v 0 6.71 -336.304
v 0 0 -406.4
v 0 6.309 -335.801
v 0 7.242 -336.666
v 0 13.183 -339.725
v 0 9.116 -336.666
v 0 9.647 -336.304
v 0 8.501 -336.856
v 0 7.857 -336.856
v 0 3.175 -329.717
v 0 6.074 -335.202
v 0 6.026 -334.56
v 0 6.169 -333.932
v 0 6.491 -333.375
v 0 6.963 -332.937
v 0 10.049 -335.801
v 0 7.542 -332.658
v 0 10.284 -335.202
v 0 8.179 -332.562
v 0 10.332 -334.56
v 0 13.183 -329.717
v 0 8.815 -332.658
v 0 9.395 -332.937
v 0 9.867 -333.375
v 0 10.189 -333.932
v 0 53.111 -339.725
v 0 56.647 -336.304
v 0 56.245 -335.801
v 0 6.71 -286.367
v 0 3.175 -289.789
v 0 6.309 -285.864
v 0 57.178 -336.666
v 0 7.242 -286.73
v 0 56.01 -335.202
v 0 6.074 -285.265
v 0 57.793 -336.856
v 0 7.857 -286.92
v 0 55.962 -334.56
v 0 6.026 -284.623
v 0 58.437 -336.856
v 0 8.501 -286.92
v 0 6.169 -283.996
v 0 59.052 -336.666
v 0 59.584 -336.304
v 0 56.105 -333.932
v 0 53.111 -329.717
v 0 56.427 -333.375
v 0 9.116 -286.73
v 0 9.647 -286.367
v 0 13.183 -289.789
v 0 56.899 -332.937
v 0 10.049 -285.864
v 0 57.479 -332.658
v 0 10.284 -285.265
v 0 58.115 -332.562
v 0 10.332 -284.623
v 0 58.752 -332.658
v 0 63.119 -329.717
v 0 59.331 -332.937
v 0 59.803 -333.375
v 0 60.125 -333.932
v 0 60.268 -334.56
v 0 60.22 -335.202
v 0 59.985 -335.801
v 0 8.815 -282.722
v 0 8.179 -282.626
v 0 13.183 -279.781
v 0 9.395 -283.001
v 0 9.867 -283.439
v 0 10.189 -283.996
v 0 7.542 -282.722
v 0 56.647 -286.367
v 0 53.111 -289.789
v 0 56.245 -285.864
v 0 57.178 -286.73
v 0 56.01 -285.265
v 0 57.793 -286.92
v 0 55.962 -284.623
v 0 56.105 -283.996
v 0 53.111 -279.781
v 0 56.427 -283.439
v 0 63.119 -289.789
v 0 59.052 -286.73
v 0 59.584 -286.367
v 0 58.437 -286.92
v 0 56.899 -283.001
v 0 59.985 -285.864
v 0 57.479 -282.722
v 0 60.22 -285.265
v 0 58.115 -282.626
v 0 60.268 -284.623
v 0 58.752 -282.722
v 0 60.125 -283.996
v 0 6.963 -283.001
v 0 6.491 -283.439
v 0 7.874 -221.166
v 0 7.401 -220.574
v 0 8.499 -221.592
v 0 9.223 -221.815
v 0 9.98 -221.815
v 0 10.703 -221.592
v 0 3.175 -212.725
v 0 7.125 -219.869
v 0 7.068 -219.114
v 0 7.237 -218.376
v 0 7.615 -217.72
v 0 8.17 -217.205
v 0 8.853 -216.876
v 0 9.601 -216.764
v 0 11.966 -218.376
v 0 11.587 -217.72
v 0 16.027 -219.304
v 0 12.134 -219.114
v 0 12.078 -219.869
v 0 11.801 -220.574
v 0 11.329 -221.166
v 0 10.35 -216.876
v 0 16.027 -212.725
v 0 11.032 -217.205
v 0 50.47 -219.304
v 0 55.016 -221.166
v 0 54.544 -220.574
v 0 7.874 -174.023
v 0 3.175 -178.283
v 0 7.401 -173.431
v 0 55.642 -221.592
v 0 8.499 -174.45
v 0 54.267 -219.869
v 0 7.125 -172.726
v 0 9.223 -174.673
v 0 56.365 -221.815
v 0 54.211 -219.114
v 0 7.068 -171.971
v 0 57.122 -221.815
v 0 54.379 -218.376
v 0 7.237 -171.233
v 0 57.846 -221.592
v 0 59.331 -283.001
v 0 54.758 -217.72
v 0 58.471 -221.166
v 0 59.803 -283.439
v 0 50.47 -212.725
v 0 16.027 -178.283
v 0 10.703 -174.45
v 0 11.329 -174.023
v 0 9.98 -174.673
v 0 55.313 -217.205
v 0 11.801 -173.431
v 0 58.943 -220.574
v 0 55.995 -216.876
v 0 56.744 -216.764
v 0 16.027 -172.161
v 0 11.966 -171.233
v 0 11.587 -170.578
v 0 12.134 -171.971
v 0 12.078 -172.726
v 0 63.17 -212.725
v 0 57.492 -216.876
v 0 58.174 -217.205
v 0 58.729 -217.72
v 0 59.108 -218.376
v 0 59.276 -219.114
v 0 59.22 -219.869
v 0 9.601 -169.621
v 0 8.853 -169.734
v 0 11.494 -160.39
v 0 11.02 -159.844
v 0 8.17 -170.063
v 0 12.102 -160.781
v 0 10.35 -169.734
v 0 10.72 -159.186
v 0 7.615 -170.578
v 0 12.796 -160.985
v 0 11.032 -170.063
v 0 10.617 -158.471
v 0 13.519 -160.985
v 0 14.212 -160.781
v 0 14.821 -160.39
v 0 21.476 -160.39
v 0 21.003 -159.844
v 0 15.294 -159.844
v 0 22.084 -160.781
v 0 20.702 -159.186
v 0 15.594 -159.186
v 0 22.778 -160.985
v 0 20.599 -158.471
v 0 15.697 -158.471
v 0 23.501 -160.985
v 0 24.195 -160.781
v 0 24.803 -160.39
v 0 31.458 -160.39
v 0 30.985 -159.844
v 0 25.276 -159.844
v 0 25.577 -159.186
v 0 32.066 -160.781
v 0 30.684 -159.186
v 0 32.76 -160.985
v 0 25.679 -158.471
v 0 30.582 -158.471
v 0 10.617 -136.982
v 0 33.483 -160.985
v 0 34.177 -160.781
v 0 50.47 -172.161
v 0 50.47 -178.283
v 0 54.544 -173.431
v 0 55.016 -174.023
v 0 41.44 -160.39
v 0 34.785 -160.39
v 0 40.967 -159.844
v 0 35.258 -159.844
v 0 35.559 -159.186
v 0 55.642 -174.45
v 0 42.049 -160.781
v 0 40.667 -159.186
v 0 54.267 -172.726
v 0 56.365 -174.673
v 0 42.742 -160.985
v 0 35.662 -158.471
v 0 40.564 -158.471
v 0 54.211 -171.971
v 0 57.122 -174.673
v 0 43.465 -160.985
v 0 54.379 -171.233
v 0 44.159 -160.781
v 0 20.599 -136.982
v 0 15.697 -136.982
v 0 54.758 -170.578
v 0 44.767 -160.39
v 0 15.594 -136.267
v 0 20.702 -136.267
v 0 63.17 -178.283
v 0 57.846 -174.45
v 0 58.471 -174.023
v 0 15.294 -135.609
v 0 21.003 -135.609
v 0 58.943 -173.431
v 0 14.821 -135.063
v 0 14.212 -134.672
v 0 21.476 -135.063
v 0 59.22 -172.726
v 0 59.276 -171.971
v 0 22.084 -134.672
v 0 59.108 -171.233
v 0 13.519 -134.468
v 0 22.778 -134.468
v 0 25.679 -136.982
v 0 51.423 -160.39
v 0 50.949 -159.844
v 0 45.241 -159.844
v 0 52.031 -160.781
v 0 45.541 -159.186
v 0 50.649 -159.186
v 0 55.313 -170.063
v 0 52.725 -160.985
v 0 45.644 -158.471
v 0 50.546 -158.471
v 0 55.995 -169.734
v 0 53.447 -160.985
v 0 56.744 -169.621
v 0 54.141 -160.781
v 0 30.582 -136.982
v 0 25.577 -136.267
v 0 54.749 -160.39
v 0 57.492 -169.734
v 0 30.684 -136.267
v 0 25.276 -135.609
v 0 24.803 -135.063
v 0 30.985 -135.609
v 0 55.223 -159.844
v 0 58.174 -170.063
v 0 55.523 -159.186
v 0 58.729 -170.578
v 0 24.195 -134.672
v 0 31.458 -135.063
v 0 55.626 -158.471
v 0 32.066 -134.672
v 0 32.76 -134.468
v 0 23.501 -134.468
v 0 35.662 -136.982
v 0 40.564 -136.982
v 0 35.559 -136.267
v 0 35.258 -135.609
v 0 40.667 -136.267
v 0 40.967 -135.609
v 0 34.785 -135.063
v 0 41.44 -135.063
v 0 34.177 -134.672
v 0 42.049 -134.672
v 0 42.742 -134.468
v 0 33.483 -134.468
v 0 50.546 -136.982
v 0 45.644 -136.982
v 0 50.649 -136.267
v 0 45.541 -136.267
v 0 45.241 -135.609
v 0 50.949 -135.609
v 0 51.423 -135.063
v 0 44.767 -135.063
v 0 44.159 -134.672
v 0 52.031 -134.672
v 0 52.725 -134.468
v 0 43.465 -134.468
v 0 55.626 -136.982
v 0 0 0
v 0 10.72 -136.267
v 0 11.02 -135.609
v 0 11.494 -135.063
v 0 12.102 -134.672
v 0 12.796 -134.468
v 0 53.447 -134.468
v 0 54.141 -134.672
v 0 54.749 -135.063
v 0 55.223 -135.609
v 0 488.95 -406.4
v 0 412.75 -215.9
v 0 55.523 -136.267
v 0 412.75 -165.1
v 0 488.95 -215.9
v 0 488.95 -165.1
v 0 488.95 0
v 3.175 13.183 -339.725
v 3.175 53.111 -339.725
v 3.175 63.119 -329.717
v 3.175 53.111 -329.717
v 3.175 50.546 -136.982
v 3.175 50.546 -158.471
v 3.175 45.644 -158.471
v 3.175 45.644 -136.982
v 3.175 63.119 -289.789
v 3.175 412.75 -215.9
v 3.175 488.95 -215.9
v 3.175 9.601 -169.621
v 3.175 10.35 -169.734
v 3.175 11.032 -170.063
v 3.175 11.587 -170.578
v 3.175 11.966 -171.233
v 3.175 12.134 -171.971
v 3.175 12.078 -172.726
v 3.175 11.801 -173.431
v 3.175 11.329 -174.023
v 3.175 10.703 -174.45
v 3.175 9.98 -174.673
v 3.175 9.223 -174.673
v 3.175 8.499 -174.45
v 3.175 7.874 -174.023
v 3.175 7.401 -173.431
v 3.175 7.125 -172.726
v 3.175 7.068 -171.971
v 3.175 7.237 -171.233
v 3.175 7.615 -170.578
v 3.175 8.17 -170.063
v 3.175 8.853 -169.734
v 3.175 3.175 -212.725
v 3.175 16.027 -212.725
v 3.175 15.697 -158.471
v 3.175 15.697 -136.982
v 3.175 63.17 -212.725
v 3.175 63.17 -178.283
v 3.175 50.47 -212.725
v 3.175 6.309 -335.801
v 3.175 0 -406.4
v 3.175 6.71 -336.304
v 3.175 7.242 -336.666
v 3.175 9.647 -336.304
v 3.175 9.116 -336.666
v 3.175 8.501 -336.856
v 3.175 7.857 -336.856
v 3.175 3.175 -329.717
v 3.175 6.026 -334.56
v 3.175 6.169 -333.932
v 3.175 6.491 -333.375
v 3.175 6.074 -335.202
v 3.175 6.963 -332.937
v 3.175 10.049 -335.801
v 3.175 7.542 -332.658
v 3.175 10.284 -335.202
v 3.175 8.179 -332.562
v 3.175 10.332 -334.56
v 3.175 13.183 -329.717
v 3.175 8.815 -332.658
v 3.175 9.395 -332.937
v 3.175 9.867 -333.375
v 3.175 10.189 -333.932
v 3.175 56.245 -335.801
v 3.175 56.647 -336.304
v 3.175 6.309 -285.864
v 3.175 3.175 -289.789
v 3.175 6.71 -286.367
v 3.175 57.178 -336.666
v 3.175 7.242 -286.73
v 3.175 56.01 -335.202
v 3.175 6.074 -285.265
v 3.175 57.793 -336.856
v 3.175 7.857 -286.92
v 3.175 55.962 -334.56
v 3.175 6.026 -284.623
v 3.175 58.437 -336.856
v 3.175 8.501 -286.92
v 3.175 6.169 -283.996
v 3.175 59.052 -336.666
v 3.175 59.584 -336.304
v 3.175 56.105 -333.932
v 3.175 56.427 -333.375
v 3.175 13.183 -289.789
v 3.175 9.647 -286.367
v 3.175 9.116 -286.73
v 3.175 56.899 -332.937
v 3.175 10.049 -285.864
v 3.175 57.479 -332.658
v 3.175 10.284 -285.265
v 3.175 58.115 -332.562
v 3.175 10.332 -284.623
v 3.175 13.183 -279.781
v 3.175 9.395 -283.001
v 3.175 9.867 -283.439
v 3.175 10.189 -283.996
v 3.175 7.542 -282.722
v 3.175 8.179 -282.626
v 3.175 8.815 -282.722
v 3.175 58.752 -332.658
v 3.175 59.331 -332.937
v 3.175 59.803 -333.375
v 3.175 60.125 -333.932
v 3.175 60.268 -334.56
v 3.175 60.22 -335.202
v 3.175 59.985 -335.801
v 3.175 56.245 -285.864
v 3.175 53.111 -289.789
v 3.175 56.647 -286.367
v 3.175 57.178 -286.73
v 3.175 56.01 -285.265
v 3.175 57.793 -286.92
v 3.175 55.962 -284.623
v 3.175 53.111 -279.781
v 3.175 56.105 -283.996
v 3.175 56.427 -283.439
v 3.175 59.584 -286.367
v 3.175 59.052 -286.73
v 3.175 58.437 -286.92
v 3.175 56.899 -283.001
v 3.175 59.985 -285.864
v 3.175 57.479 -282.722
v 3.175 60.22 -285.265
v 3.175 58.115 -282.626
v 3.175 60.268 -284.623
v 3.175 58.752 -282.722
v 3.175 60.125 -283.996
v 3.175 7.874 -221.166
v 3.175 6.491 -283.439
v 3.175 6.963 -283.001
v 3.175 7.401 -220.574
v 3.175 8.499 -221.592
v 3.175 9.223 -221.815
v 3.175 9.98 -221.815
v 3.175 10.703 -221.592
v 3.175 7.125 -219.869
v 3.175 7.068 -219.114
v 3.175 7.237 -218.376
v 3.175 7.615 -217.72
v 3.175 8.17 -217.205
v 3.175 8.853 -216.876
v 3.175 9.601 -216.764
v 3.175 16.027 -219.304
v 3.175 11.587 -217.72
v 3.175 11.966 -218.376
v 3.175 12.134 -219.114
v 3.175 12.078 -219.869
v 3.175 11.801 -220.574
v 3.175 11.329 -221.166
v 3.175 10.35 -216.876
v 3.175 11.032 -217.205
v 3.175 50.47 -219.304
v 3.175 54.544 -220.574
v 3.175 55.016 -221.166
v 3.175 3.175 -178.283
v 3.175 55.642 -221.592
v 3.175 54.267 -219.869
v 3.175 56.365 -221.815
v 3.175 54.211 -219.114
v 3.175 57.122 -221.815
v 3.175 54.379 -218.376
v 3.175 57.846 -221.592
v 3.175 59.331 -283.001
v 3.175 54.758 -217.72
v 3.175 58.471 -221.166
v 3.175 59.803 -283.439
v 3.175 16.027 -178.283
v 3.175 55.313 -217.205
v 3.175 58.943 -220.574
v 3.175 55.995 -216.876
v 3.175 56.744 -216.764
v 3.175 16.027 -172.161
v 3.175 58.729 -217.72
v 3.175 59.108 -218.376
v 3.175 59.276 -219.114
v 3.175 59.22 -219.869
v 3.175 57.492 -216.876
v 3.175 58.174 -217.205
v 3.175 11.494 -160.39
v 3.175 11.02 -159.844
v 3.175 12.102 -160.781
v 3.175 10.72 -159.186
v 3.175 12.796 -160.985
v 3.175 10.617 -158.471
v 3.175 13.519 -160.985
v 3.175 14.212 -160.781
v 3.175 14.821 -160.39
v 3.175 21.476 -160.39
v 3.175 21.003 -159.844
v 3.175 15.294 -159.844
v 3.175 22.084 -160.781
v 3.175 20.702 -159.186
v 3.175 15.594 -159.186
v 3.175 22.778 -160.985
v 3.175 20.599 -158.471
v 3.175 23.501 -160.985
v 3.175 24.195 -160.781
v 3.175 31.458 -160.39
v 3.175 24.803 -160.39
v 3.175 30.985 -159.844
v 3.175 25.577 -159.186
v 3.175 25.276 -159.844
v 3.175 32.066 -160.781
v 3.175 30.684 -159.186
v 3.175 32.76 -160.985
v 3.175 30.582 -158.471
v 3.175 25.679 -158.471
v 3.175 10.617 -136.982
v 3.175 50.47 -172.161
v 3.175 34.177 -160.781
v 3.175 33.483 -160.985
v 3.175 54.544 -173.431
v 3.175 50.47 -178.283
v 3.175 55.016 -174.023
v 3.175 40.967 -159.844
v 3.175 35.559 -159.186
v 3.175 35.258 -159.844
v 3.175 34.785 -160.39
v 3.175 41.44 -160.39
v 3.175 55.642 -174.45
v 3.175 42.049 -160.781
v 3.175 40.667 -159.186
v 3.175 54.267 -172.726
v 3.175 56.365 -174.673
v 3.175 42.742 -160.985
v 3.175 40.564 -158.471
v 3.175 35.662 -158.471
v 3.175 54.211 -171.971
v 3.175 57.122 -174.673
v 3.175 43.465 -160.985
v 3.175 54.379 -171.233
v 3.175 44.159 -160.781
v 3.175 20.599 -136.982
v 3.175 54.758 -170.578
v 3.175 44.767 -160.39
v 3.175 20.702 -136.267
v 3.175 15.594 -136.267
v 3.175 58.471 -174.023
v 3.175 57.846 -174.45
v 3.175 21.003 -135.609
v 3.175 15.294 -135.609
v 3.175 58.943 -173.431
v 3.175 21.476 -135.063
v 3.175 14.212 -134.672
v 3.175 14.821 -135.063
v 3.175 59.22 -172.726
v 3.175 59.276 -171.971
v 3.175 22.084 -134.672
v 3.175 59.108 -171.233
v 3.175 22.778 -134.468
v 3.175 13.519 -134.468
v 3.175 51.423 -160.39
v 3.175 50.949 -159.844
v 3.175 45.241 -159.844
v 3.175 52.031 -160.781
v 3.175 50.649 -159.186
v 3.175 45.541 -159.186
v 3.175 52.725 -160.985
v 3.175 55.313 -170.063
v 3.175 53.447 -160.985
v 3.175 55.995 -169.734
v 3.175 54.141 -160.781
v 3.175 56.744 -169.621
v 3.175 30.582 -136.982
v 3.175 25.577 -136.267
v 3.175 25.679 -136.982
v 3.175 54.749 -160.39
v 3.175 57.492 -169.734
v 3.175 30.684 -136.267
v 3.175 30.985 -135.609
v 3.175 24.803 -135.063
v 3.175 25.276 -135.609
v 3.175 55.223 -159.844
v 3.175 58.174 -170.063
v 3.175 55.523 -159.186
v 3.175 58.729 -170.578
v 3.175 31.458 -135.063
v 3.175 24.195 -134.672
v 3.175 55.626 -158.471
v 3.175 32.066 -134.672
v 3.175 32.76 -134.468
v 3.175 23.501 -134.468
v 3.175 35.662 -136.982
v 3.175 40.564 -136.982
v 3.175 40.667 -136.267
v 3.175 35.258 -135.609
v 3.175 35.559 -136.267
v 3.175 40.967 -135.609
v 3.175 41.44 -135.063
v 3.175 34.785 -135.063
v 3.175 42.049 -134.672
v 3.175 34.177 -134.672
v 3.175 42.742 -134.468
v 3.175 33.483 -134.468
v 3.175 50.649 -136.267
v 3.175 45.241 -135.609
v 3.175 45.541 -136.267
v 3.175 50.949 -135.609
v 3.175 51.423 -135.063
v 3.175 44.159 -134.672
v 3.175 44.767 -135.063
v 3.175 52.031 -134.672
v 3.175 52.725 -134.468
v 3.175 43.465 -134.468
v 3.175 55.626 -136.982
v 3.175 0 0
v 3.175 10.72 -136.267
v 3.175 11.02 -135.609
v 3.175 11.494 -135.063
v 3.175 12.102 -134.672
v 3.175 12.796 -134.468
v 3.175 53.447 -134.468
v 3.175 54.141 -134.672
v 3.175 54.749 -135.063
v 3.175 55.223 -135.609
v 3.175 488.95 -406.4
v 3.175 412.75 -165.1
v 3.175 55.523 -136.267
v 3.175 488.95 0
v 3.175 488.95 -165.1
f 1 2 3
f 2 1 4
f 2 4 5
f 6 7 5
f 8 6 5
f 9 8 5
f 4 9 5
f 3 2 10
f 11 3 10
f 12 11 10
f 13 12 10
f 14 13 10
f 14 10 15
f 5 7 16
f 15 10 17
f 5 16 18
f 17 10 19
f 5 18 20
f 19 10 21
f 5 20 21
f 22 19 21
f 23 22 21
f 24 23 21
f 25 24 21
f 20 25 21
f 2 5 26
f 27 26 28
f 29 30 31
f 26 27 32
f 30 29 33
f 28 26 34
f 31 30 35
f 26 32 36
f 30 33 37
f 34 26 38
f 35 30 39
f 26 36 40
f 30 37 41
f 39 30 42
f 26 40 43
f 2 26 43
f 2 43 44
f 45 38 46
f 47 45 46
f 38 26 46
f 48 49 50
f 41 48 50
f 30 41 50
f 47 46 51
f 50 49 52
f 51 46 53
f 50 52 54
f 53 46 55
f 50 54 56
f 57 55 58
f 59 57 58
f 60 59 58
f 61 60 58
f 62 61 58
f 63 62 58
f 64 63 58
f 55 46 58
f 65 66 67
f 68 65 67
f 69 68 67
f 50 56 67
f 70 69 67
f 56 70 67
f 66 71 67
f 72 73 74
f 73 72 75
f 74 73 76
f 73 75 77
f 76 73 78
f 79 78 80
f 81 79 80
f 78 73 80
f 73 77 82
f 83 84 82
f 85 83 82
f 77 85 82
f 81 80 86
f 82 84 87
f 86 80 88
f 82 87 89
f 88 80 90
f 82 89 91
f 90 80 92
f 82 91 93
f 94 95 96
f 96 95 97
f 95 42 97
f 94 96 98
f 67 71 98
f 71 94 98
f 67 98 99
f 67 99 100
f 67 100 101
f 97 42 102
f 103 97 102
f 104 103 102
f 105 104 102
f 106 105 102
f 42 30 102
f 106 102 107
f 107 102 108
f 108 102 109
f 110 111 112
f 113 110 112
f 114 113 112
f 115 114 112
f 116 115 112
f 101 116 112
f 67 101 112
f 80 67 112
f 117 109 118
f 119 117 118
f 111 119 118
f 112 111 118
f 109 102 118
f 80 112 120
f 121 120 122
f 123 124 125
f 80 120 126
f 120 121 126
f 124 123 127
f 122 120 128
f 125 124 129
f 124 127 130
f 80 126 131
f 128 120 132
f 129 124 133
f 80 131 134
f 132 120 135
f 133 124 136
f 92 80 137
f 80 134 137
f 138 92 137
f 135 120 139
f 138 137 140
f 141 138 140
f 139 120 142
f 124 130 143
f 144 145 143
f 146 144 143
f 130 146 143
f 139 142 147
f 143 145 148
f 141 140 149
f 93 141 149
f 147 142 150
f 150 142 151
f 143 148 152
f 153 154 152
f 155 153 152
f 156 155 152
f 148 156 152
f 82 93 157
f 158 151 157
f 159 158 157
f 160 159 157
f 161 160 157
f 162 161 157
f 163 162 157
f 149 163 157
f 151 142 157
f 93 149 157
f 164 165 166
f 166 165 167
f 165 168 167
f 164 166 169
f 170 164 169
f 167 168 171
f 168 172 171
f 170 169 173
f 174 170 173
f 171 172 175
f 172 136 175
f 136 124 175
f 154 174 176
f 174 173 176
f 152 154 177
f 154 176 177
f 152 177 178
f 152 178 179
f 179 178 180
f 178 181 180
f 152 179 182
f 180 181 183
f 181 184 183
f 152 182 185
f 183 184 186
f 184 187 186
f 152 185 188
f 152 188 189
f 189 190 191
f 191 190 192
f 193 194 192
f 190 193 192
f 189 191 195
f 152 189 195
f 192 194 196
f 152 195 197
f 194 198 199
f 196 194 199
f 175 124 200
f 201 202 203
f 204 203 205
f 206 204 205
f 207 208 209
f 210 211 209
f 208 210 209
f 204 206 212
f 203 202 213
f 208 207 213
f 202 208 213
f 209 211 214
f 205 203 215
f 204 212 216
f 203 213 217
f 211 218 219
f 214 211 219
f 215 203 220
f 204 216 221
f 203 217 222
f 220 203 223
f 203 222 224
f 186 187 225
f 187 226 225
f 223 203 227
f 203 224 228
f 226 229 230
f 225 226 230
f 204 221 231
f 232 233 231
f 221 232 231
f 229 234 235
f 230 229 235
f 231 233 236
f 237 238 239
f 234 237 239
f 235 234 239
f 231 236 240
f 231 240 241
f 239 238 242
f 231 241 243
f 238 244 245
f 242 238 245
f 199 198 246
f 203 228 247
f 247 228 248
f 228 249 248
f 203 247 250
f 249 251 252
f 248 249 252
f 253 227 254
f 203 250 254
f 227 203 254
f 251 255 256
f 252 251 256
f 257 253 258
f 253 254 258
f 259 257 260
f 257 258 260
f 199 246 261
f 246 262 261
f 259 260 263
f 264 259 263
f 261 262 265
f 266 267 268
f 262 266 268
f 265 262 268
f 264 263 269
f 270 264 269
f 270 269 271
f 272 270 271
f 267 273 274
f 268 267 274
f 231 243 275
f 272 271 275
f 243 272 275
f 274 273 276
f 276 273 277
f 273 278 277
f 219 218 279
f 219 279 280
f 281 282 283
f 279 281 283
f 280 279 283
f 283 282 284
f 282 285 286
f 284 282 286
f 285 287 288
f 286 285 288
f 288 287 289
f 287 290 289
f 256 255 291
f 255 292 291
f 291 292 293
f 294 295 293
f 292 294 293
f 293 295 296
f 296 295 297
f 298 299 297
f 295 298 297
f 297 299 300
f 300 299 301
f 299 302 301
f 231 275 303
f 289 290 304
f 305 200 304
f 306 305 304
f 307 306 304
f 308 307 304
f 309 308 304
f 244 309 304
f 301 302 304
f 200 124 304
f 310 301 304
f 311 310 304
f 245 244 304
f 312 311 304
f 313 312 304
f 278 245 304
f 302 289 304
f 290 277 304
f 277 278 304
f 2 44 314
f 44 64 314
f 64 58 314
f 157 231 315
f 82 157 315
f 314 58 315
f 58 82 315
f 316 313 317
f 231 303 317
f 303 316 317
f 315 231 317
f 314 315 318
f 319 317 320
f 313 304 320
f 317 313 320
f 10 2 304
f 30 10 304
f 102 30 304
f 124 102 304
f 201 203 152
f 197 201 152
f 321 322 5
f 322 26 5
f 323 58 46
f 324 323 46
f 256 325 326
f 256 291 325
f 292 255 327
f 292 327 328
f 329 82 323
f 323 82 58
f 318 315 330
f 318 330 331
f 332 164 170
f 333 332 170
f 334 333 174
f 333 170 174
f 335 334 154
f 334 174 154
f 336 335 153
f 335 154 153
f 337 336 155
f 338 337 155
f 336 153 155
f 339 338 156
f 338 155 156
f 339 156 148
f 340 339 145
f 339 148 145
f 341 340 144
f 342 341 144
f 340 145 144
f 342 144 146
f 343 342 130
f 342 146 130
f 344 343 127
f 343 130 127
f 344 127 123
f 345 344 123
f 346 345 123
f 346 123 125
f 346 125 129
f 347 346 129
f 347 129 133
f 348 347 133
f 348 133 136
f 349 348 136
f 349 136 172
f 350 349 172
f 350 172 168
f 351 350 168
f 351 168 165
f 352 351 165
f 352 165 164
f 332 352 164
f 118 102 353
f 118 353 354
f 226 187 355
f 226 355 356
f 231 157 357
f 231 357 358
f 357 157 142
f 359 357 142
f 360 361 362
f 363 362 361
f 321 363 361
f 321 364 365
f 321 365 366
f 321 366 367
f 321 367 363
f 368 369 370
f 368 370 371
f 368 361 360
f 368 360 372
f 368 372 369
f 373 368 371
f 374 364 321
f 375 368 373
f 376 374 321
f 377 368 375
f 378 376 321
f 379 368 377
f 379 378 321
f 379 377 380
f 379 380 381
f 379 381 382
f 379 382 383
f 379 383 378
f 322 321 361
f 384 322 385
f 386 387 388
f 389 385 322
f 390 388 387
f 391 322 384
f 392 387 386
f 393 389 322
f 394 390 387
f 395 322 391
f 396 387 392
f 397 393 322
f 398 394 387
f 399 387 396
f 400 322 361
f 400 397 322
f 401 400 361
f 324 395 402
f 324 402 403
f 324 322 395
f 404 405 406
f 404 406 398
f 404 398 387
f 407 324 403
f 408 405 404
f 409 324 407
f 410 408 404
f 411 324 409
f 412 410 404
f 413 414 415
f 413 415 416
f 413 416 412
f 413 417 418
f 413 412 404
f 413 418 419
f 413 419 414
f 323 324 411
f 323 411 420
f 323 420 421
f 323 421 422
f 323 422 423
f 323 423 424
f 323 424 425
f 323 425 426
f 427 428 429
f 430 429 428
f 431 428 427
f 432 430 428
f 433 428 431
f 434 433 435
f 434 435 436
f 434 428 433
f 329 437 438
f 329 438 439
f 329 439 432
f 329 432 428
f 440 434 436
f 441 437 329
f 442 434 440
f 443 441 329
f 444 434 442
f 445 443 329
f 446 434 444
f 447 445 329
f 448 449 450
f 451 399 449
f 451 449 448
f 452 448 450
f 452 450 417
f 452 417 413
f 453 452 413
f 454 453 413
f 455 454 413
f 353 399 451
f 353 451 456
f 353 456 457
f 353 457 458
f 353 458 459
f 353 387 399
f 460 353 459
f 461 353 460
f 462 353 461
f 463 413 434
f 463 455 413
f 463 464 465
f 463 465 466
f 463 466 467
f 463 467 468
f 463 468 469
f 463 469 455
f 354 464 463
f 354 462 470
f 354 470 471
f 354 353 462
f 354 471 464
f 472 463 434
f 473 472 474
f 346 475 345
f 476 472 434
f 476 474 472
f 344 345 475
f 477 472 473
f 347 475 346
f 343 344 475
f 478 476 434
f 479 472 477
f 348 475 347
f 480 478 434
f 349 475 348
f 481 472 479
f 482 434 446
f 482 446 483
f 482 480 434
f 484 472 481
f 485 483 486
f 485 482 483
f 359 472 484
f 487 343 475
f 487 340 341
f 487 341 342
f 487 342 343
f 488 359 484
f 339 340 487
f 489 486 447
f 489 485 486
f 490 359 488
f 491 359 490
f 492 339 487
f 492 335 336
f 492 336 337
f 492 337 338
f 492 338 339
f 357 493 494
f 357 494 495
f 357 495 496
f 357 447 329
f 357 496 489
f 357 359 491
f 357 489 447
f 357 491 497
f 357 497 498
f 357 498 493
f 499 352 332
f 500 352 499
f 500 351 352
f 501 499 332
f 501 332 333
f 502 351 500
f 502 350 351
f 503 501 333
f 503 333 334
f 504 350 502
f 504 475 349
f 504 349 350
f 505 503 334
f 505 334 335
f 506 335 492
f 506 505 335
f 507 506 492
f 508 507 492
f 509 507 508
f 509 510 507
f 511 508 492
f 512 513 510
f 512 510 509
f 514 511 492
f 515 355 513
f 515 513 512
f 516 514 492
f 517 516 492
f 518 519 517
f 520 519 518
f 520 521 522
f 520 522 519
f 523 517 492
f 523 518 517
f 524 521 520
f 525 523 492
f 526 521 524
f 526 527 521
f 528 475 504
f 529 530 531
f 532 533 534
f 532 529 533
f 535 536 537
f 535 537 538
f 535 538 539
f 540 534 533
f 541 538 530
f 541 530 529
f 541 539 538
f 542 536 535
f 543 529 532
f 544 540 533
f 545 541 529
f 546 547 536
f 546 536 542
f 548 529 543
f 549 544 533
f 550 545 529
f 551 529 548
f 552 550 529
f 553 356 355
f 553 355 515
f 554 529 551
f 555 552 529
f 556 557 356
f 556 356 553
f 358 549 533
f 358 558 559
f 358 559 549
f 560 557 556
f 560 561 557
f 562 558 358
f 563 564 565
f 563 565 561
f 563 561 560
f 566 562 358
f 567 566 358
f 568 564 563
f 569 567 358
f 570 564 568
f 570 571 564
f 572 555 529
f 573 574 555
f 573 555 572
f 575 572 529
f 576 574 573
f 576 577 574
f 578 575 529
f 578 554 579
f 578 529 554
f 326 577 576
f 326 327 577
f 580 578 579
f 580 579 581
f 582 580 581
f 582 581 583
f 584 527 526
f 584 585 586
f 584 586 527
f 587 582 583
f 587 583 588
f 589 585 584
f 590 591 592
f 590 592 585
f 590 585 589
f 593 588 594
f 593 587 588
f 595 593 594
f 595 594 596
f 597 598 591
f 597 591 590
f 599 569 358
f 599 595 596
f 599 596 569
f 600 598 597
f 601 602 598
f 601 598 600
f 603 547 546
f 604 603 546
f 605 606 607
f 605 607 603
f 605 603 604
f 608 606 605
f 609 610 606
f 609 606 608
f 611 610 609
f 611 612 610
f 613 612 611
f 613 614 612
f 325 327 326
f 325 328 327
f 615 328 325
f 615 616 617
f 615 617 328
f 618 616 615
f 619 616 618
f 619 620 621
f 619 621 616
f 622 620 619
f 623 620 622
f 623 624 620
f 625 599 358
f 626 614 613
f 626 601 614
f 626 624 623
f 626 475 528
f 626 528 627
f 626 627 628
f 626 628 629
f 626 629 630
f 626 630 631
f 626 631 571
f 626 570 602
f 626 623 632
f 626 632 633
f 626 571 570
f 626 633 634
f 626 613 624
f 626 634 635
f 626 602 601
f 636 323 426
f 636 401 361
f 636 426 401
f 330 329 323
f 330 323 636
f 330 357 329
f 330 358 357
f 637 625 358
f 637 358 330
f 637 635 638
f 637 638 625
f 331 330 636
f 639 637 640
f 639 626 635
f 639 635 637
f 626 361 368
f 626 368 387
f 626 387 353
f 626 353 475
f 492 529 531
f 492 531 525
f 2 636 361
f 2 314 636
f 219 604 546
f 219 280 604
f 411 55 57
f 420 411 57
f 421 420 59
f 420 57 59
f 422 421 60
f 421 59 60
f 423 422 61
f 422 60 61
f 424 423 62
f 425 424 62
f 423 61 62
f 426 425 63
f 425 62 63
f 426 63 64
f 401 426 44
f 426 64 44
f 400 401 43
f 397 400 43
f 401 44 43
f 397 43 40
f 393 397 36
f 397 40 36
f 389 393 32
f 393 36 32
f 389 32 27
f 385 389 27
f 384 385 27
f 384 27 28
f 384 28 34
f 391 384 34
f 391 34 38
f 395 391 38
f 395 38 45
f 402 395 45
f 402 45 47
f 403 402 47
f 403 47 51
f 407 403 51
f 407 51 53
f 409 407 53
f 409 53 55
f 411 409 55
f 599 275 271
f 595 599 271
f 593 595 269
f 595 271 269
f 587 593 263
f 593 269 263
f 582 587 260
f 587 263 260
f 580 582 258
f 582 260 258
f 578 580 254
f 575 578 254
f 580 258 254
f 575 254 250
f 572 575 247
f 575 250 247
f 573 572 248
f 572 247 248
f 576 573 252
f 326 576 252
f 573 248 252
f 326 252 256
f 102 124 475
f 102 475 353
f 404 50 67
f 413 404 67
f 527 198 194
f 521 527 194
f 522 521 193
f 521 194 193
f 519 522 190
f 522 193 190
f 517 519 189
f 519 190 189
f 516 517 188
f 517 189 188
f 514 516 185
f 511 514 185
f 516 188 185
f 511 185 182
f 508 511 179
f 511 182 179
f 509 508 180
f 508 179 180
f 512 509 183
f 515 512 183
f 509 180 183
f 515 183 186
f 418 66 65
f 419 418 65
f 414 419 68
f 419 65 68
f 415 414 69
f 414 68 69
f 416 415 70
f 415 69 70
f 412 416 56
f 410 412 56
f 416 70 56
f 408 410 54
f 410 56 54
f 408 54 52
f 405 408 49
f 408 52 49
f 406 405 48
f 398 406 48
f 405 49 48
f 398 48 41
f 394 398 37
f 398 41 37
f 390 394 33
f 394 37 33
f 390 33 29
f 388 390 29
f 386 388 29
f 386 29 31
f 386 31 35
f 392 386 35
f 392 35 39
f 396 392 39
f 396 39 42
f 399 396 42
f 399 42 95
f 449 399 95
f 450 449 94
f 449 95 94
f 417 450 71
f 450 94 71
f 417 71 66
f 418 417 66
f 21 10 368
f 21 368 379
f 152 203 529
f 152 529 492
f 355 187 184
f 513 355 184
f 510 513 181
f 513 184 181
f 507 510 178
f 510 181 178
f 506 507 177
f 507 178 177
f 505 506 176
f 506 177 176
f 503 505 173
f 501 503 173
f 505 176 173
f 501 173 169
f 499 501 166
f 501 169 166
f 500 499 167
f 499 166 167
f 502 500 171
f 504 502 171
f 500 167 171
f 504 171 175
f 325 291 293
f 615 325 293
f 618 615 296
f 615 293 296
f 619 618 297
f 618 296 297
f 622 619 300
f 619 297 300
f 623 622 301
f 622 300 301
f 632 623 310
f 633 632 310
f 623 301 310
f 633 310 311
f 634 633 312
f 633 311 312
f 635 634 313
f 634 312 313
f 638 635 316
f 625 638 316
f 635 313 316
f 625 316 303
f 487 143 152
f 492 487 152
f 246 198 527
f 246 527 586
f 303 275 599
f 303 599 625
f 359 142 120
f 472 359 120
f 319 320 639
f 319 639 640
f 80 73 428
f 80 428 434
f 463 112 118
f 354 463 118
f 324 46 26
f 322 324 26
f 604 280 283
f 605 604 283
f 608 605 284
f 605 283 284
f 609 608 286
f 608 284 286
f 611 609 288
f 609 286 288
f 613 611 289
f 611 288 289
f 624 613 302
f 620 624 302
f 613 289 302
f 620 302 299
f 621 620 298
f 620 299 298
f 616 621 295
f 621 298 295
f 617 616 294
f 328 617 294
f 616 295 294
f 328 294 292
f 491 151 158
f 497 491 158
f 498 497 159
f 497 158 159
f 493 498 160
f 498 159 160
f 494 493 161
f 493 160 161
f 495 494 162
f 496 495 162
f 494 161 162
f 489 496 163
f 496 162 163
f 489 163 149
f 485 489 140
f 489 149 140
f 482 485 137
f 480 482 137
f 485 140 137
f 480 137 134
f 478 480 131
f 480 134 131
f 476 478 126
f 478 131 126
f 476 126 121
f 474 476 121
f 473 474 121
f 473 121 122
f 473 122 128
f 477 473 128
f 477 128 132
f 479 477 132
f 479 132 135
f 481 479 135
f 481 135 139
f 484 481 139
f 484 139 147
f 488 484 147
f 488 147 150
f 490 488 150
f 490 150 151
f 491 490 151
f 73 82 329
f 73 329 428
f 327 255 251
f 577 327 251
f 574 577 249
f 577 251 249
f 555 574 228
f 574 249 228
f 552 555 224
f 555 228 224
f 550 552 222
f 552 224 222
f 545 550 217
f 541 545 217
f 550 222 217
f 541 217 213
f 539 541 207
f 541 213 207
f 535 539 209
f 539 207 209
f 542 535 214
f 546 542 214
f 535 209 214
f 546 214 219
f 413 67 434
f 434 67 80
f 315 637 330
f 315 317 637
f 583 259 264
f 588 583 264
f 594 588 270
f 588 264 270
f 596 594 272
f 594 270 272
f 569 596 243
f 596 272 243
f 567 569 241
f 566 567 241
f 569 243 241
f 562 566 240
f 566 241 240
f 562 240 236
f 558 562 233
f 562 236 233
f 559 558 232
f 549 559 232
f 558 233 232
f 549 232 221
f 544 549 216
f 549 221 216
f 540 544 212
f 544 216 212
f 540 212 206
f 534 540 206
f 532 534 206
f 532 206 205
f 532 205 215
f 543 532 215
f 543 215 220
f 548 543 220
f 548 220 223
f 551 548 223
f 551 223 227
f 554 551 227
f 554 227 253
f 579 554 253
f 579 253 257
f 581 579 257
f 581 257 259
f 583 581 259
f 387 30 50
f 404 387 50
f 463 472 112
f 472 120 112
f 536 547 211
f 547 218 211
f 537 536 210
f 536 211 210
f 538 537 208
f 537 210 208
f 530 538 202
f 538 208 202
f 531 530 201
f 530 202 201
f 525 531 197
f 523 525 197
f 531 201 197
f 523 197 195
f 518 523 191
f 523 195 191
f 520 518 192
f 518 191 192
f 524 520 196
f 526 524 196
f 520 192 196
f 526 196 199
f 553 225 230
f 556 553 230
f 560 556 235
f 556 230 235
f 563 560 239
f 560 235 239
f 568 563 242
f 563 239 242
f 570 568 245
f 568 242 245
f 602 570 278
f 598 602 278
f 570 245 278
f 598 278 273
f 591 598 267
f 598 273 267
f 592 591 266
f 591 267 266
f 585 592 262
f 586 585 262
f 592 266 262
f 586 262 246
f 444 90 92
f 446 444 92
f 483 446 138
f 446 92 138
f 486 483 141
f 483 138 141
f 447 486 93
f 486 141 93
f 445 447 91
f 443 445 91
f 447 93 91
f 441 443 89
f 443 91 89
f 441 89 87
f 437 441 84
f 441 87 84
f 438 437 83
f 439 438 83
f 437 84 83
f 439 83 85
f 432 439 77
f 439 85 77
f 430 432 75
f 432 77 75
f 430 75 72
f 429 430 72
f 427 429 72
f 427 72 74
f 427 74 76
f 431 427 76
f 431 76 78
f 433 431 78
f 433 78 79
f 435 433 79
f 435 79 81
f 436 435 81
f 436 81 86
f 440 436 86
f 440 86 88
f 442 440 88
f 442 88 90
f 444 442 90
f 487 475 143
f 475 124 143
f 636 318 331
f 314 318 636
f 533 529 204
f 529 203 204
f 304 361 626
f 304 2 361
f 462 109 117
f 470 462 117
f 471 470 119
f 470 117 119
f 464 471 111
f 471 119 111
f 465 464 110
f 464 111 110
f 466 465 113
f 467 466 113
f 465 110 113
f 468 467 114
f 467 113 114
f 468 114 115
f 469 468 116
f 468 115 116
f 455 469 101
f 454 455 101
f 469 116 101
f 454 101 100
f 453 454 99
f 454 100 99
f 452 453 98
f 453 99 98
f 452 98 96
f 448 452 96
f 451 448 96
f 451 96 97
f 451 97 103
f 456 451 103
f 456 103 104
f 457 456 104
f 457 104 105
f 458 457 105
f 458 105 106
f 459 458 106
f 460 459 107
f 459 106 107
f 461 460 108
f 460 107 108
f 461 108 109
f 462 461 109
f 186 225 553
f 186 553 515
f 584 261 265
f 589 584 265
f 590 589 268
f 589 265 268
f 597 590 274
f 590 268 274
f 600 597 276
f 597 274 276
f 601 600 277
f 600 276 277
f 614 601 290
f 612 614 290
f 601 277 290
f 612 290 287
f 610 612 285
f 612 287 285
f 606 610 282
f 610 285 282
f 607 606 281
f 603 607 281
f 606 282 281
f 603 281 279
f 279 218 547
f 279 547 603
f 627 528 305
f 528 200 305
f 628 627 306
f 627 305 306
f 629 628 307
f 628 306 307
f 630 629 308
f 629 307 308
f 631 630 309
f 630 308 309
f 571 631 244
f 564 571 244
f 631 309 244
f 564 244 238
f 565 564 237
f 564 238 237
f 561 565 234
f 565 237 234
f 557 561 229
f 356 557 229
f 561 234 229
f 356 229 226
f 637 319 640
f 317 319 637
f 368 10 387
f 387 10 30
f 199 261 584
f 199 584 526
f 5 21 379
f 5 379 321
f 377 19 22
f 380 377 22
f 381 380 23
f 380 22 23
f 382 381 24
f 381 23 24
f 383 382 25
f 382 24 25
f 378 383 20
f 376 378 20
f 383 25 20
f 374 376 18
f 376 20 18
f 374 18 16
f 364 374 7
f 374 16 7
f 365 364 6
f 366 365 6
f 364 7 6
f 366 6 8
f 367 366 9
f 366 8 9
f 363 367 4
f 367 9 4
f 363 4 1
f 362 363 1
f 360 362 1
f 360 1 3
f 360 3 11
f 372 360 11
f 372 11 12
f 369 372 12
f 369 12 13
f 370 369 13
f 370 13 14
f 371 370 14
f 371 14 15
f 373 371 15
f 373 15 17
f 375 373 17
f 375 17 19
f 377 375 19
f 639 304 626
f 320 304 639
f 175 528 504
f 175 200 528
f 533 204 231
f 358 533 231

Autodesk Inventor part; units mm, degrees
ref_plane "YZ Plane" through (0, 0, 0) normal (1, 0, 0) x (0, 1, 0)
ref_plane "XZ Plane" through (0, 0, 0) normal (0, 1, 0) x (-1, 0, 0)
ref_plane "XY Plane" through (0, 0, 0) normal (0, 0, 1) x (1, 0, 0)
sketch "Sketch1" plane through (0, 0, 0) normal (1, 0, 0) x (0, 1, 0)
  line L0 (0, 0) -> (488.95, 0)
  line L1 (488.95, -406.4) -> (0, -406.4)
  line L2 (0, -406.4) -> (0, 0)
  line L3 (488.95, 0) -> (488.95, -165.1)
  line L4 (488.95, -165.1) -> (412.75, -165.1)
  line L5 (412.75, -165.1) -> (412.75, -215.9)
  line L6 (412.75, -215.9) -> (488.95, -215.9)
  line L7 (488.95, 0) -> (488.95, -165.1)
  line L8 (488.95, -215.9) -> (488.95, -406.4)
  line L9 (346.075, 3.175) -> (342.9, 3.175)
  line L10 (342.9, 3.175) -> (346.075, 3.175)
  line L11 (358.775, 3.175) -> (361.95, 3.175)
  line L12 (374.65, 3.175) -> (377.825, 3.175)
  line L13 (390.525, 3.175) -> (393.7, 3.175)
  line L14 (98.425, -406.4) -> (3.175, -406.4)
  line L15 (457.2, 0) -> (0, 0)
  line L16 (3.175, 0) -> (98.425, 0)
  line L17 (0, -406.4) -> (3.175, -406.4)
  dimension "d9" = 3.175
extrude "Extrusion1" add sketch "Sketch1" along normal blind 3.175
sketch "Sketch2" plane through (0, 0, 0) normal (-1, 0, 0) x (0, 0, 1)
  line L0 (-406.4, 0) -> (-406.4, 488.95) projected
  line L1 (0, 0) -> (-406.4, 0) projected
  line L2 (0, 488.95) -> (0, 0) projected
  line L3 (-165.1, 488.95) -> (0, 488.95) projected
  line L4 (-165.1, 412.75) -> (-165.1, 488.95) projected
  line L5 (-215.9, 412.75) -> (-165.1, 412.75) projected
  line L6 (-215.9, 488.95) -> (-215.9, 412.75) projected
  line L7 (-406.4, 488.95) -> (-215.9, 488.95) projected
  line L8 (-339.725, 53.1114) -> (-339.725, 13.1826)
  line L9 (-279.781, 13.1826) -> (-279.781, 53.1114)
  line L10 (-289.7886, 63.119) -> (-329.7174, 63.119)
  circle A0 centre (-334.7212, 58.1152) radius 2.159
  circle A1 centre (-284.7848, 58.1152) radius 2.159
  circle A2 centre (-334.7212, 8.1788) radius 2.159
  circle A3 centre (-284.7848, 8.1788) radius 2.159
  line L11 (-329.7174, 63.119) -> (-329.7174, 53.1114)
  line L12 (-329.7174, 53.1114) -> (-339.725, 53.1114)
  line L13 (-289.7886, 63.119) -> (-289.7886, 53.1114)
  line L14 (-289.7886, 53.1114) -> (-279.781, 53.1114)
  line L15 (-329.7174, 3.175) -> (-329.7174, 13.1826)
  line L16 (-329.7174, 13.1826) -> (-339.725, 13.1826)
  line L17 (-289.7886, 3.175) -> (-289.7886, 13.1826)
  line L18 (-289.7886, 13.1826) -> (-279.781, 13.1826)
  line L19 (-212.725, 63.1698) -> (-178.2826, 63.1698)
  circle A4 centre (-219.3036, 56.7436) radius 2.54
  circle A5 centre (-219.3036, 9.6012) radius 2.54
  circle A6 centre (-172.1612, 56.7436) radius 2.54
  circle A7 centre (-172.1612, 9.6012) radius 2.54
  line L20 (-136.9822, 10.6172) -> (-158.4706, 10.6172)
  line L21 (-158.4706, 15.6972) -> (-136.9822, 15.6972)
  arc A8 (-136.9822, 10.6172) -> (-136.9822, 15.6972) centre (-136.9822, 13.1572) ccw
  arc A9 (-158.4706, 15.6972) -> (-158.4706, 10.6172) centre (-158.4706, 13.1572) ccw
  line L22 (-136.9822, 20.5994) -> (-158.4706, 20.5994)
  line L23 (-158.4706, 25.6794) -> (-136.9822, 25.6794)
  arc A10 (-136.9822, 20.5994) -> (-136.9822, 25.6794) centre (-136.9822, 23.1394) ccw
  arc A11 (-158.4706, 25.6794) -> (-158.4706, 20.5994) centre (-158.4706, 23.1394) ccw
  line L24 (-136.9822, 30.5816) -> (-158.4706, 30.5816)
  line L25 (-158.4706, 35.6616) -> (-136.9822, 35.6616)
  arc A12 (-136.9822, 30.5816) -> (-136.9822, 35.6616) centre (-136.9822, 33.1216) ccw
  arc A13 (-158.4706, 35.6616) -> (-158.4706, 30.5816) centre (-158.4706, 33.1216) ccw
  line L26 (-136.9822, 40.5638) -> (-158.4706, 40.5638)
  line L27 (-158.4706, 45.6438) -> (-136.9822, 45.6438)
  arc A14 (-136.9822, 40.5638) -> (-136.9822, 45.6438) centre (-136.9822, 43.1038) ccw
  arc A15 (-158.4706, 45.6438) -> (-158.4706, 40.5638) centre (-158.4706, 43.1038) ccw
  line L28 (-136.9822, 50.546) -> (-158.4706, 50.546)
  line L29 (-158.4706, 55.626) -> (-136.9822, 55.626)
  arc A16 (-136.9822, 50.546) -> (-136.9822, 55.626) centre (-136.9822, 53.086) ccw
  arc A17 (-158.4706, 55.626) -> (-158.4706, 50.546) centre (-158.4706, 53.086) ccw
  line L30 (-212.725, 63.1698) -> (-212.725, 50.4698)
  line L31 (-212.725, 50.4698) -> (-219.3036, 50.4698)
  line L32 (-172.1612, 50.4698) -> (-178.2826, 50.4698)
  line L33 (-178.2826, 50.4698) -> (-178.2826, 63.1698)
  line L34 (-178.2826, 3.3274) -> (-178.2826, 16.0274)
  line L35 (-178.2826, 16.0274) -> (-172.1612, 16.0274)
  line L36 (-219.3036, 16.0274) -> (-212.725, 16.0274)
  line L37 (-212.725, 16.0274) -> (-212.725, 3.3274)
  line L38 (-219.3036, 50.4698) -> (-219.3036, 16.0274)
  line L39 (-172.1612, 50.4698) -> (-172.1612, 16.0274)
  line L40 (-403.225, 3.175) -> (-339.725, 3.175)
  line L41 (-329.7174, 3.175) -> (-289.7886, 3.175)
  line L42 (53.975, 3.175) -> (-403.225, 3.175)
  line L43 (-178.2826, 6.0198) -> (-178.2826, 0)
  line L44 (-178.2826, 0) -> (-212.725, 0)
  line L45 (-212.725, 0) -> (-212.725, 6.0198)
  line L46 (-406.4, 0) -> (-406.4, 488.95) projected
  line L47 (-406.4, 0) -> (-406.4, 3.175)
  line L48 (-406.4, 0) -> (-403.225, 0)
  line L49 (-403.225, 0) -> (-403.225, 3.175)
  line L50 (-403.225, 3.175) -> (-406.4, 3.175)
  line L51 (-406.4, 3.175) -> (-406.4, 0)
  point P0 (-332.8924, 0)
  point P1 (-292.9636, 0)
  point P2 (-212.725, 0)
  point P3 (-178.2826, 0)
  point P4 (-212.725, 3.175)
  point P5 (-178.2826, 3.175)
  dimension "d12" = 3.175
  dimension "d15" = 3.175
  dimension "d16" = 3.175
extrude "Extrusion3" cut sketch "Sketch2" against normal blind 25.4 contours L45 L37 L36 L38 L31 L30 L19 L33 L32 L39 L35 L34 L43 L42 | L15 L16 L8 L12 L11 L10 L13 L14 L9 L18 L17 L41 | A0 | A1 | A2 | A3 | A4 | A5 | A6 | A7 | L20 A9 L21 A8 | L22 A11 L23 A10 | L24 A13 L25 A12 | L26 A15 L27 A14 | L28 A17 L29 A16
properties part number "220310 Left Side"
